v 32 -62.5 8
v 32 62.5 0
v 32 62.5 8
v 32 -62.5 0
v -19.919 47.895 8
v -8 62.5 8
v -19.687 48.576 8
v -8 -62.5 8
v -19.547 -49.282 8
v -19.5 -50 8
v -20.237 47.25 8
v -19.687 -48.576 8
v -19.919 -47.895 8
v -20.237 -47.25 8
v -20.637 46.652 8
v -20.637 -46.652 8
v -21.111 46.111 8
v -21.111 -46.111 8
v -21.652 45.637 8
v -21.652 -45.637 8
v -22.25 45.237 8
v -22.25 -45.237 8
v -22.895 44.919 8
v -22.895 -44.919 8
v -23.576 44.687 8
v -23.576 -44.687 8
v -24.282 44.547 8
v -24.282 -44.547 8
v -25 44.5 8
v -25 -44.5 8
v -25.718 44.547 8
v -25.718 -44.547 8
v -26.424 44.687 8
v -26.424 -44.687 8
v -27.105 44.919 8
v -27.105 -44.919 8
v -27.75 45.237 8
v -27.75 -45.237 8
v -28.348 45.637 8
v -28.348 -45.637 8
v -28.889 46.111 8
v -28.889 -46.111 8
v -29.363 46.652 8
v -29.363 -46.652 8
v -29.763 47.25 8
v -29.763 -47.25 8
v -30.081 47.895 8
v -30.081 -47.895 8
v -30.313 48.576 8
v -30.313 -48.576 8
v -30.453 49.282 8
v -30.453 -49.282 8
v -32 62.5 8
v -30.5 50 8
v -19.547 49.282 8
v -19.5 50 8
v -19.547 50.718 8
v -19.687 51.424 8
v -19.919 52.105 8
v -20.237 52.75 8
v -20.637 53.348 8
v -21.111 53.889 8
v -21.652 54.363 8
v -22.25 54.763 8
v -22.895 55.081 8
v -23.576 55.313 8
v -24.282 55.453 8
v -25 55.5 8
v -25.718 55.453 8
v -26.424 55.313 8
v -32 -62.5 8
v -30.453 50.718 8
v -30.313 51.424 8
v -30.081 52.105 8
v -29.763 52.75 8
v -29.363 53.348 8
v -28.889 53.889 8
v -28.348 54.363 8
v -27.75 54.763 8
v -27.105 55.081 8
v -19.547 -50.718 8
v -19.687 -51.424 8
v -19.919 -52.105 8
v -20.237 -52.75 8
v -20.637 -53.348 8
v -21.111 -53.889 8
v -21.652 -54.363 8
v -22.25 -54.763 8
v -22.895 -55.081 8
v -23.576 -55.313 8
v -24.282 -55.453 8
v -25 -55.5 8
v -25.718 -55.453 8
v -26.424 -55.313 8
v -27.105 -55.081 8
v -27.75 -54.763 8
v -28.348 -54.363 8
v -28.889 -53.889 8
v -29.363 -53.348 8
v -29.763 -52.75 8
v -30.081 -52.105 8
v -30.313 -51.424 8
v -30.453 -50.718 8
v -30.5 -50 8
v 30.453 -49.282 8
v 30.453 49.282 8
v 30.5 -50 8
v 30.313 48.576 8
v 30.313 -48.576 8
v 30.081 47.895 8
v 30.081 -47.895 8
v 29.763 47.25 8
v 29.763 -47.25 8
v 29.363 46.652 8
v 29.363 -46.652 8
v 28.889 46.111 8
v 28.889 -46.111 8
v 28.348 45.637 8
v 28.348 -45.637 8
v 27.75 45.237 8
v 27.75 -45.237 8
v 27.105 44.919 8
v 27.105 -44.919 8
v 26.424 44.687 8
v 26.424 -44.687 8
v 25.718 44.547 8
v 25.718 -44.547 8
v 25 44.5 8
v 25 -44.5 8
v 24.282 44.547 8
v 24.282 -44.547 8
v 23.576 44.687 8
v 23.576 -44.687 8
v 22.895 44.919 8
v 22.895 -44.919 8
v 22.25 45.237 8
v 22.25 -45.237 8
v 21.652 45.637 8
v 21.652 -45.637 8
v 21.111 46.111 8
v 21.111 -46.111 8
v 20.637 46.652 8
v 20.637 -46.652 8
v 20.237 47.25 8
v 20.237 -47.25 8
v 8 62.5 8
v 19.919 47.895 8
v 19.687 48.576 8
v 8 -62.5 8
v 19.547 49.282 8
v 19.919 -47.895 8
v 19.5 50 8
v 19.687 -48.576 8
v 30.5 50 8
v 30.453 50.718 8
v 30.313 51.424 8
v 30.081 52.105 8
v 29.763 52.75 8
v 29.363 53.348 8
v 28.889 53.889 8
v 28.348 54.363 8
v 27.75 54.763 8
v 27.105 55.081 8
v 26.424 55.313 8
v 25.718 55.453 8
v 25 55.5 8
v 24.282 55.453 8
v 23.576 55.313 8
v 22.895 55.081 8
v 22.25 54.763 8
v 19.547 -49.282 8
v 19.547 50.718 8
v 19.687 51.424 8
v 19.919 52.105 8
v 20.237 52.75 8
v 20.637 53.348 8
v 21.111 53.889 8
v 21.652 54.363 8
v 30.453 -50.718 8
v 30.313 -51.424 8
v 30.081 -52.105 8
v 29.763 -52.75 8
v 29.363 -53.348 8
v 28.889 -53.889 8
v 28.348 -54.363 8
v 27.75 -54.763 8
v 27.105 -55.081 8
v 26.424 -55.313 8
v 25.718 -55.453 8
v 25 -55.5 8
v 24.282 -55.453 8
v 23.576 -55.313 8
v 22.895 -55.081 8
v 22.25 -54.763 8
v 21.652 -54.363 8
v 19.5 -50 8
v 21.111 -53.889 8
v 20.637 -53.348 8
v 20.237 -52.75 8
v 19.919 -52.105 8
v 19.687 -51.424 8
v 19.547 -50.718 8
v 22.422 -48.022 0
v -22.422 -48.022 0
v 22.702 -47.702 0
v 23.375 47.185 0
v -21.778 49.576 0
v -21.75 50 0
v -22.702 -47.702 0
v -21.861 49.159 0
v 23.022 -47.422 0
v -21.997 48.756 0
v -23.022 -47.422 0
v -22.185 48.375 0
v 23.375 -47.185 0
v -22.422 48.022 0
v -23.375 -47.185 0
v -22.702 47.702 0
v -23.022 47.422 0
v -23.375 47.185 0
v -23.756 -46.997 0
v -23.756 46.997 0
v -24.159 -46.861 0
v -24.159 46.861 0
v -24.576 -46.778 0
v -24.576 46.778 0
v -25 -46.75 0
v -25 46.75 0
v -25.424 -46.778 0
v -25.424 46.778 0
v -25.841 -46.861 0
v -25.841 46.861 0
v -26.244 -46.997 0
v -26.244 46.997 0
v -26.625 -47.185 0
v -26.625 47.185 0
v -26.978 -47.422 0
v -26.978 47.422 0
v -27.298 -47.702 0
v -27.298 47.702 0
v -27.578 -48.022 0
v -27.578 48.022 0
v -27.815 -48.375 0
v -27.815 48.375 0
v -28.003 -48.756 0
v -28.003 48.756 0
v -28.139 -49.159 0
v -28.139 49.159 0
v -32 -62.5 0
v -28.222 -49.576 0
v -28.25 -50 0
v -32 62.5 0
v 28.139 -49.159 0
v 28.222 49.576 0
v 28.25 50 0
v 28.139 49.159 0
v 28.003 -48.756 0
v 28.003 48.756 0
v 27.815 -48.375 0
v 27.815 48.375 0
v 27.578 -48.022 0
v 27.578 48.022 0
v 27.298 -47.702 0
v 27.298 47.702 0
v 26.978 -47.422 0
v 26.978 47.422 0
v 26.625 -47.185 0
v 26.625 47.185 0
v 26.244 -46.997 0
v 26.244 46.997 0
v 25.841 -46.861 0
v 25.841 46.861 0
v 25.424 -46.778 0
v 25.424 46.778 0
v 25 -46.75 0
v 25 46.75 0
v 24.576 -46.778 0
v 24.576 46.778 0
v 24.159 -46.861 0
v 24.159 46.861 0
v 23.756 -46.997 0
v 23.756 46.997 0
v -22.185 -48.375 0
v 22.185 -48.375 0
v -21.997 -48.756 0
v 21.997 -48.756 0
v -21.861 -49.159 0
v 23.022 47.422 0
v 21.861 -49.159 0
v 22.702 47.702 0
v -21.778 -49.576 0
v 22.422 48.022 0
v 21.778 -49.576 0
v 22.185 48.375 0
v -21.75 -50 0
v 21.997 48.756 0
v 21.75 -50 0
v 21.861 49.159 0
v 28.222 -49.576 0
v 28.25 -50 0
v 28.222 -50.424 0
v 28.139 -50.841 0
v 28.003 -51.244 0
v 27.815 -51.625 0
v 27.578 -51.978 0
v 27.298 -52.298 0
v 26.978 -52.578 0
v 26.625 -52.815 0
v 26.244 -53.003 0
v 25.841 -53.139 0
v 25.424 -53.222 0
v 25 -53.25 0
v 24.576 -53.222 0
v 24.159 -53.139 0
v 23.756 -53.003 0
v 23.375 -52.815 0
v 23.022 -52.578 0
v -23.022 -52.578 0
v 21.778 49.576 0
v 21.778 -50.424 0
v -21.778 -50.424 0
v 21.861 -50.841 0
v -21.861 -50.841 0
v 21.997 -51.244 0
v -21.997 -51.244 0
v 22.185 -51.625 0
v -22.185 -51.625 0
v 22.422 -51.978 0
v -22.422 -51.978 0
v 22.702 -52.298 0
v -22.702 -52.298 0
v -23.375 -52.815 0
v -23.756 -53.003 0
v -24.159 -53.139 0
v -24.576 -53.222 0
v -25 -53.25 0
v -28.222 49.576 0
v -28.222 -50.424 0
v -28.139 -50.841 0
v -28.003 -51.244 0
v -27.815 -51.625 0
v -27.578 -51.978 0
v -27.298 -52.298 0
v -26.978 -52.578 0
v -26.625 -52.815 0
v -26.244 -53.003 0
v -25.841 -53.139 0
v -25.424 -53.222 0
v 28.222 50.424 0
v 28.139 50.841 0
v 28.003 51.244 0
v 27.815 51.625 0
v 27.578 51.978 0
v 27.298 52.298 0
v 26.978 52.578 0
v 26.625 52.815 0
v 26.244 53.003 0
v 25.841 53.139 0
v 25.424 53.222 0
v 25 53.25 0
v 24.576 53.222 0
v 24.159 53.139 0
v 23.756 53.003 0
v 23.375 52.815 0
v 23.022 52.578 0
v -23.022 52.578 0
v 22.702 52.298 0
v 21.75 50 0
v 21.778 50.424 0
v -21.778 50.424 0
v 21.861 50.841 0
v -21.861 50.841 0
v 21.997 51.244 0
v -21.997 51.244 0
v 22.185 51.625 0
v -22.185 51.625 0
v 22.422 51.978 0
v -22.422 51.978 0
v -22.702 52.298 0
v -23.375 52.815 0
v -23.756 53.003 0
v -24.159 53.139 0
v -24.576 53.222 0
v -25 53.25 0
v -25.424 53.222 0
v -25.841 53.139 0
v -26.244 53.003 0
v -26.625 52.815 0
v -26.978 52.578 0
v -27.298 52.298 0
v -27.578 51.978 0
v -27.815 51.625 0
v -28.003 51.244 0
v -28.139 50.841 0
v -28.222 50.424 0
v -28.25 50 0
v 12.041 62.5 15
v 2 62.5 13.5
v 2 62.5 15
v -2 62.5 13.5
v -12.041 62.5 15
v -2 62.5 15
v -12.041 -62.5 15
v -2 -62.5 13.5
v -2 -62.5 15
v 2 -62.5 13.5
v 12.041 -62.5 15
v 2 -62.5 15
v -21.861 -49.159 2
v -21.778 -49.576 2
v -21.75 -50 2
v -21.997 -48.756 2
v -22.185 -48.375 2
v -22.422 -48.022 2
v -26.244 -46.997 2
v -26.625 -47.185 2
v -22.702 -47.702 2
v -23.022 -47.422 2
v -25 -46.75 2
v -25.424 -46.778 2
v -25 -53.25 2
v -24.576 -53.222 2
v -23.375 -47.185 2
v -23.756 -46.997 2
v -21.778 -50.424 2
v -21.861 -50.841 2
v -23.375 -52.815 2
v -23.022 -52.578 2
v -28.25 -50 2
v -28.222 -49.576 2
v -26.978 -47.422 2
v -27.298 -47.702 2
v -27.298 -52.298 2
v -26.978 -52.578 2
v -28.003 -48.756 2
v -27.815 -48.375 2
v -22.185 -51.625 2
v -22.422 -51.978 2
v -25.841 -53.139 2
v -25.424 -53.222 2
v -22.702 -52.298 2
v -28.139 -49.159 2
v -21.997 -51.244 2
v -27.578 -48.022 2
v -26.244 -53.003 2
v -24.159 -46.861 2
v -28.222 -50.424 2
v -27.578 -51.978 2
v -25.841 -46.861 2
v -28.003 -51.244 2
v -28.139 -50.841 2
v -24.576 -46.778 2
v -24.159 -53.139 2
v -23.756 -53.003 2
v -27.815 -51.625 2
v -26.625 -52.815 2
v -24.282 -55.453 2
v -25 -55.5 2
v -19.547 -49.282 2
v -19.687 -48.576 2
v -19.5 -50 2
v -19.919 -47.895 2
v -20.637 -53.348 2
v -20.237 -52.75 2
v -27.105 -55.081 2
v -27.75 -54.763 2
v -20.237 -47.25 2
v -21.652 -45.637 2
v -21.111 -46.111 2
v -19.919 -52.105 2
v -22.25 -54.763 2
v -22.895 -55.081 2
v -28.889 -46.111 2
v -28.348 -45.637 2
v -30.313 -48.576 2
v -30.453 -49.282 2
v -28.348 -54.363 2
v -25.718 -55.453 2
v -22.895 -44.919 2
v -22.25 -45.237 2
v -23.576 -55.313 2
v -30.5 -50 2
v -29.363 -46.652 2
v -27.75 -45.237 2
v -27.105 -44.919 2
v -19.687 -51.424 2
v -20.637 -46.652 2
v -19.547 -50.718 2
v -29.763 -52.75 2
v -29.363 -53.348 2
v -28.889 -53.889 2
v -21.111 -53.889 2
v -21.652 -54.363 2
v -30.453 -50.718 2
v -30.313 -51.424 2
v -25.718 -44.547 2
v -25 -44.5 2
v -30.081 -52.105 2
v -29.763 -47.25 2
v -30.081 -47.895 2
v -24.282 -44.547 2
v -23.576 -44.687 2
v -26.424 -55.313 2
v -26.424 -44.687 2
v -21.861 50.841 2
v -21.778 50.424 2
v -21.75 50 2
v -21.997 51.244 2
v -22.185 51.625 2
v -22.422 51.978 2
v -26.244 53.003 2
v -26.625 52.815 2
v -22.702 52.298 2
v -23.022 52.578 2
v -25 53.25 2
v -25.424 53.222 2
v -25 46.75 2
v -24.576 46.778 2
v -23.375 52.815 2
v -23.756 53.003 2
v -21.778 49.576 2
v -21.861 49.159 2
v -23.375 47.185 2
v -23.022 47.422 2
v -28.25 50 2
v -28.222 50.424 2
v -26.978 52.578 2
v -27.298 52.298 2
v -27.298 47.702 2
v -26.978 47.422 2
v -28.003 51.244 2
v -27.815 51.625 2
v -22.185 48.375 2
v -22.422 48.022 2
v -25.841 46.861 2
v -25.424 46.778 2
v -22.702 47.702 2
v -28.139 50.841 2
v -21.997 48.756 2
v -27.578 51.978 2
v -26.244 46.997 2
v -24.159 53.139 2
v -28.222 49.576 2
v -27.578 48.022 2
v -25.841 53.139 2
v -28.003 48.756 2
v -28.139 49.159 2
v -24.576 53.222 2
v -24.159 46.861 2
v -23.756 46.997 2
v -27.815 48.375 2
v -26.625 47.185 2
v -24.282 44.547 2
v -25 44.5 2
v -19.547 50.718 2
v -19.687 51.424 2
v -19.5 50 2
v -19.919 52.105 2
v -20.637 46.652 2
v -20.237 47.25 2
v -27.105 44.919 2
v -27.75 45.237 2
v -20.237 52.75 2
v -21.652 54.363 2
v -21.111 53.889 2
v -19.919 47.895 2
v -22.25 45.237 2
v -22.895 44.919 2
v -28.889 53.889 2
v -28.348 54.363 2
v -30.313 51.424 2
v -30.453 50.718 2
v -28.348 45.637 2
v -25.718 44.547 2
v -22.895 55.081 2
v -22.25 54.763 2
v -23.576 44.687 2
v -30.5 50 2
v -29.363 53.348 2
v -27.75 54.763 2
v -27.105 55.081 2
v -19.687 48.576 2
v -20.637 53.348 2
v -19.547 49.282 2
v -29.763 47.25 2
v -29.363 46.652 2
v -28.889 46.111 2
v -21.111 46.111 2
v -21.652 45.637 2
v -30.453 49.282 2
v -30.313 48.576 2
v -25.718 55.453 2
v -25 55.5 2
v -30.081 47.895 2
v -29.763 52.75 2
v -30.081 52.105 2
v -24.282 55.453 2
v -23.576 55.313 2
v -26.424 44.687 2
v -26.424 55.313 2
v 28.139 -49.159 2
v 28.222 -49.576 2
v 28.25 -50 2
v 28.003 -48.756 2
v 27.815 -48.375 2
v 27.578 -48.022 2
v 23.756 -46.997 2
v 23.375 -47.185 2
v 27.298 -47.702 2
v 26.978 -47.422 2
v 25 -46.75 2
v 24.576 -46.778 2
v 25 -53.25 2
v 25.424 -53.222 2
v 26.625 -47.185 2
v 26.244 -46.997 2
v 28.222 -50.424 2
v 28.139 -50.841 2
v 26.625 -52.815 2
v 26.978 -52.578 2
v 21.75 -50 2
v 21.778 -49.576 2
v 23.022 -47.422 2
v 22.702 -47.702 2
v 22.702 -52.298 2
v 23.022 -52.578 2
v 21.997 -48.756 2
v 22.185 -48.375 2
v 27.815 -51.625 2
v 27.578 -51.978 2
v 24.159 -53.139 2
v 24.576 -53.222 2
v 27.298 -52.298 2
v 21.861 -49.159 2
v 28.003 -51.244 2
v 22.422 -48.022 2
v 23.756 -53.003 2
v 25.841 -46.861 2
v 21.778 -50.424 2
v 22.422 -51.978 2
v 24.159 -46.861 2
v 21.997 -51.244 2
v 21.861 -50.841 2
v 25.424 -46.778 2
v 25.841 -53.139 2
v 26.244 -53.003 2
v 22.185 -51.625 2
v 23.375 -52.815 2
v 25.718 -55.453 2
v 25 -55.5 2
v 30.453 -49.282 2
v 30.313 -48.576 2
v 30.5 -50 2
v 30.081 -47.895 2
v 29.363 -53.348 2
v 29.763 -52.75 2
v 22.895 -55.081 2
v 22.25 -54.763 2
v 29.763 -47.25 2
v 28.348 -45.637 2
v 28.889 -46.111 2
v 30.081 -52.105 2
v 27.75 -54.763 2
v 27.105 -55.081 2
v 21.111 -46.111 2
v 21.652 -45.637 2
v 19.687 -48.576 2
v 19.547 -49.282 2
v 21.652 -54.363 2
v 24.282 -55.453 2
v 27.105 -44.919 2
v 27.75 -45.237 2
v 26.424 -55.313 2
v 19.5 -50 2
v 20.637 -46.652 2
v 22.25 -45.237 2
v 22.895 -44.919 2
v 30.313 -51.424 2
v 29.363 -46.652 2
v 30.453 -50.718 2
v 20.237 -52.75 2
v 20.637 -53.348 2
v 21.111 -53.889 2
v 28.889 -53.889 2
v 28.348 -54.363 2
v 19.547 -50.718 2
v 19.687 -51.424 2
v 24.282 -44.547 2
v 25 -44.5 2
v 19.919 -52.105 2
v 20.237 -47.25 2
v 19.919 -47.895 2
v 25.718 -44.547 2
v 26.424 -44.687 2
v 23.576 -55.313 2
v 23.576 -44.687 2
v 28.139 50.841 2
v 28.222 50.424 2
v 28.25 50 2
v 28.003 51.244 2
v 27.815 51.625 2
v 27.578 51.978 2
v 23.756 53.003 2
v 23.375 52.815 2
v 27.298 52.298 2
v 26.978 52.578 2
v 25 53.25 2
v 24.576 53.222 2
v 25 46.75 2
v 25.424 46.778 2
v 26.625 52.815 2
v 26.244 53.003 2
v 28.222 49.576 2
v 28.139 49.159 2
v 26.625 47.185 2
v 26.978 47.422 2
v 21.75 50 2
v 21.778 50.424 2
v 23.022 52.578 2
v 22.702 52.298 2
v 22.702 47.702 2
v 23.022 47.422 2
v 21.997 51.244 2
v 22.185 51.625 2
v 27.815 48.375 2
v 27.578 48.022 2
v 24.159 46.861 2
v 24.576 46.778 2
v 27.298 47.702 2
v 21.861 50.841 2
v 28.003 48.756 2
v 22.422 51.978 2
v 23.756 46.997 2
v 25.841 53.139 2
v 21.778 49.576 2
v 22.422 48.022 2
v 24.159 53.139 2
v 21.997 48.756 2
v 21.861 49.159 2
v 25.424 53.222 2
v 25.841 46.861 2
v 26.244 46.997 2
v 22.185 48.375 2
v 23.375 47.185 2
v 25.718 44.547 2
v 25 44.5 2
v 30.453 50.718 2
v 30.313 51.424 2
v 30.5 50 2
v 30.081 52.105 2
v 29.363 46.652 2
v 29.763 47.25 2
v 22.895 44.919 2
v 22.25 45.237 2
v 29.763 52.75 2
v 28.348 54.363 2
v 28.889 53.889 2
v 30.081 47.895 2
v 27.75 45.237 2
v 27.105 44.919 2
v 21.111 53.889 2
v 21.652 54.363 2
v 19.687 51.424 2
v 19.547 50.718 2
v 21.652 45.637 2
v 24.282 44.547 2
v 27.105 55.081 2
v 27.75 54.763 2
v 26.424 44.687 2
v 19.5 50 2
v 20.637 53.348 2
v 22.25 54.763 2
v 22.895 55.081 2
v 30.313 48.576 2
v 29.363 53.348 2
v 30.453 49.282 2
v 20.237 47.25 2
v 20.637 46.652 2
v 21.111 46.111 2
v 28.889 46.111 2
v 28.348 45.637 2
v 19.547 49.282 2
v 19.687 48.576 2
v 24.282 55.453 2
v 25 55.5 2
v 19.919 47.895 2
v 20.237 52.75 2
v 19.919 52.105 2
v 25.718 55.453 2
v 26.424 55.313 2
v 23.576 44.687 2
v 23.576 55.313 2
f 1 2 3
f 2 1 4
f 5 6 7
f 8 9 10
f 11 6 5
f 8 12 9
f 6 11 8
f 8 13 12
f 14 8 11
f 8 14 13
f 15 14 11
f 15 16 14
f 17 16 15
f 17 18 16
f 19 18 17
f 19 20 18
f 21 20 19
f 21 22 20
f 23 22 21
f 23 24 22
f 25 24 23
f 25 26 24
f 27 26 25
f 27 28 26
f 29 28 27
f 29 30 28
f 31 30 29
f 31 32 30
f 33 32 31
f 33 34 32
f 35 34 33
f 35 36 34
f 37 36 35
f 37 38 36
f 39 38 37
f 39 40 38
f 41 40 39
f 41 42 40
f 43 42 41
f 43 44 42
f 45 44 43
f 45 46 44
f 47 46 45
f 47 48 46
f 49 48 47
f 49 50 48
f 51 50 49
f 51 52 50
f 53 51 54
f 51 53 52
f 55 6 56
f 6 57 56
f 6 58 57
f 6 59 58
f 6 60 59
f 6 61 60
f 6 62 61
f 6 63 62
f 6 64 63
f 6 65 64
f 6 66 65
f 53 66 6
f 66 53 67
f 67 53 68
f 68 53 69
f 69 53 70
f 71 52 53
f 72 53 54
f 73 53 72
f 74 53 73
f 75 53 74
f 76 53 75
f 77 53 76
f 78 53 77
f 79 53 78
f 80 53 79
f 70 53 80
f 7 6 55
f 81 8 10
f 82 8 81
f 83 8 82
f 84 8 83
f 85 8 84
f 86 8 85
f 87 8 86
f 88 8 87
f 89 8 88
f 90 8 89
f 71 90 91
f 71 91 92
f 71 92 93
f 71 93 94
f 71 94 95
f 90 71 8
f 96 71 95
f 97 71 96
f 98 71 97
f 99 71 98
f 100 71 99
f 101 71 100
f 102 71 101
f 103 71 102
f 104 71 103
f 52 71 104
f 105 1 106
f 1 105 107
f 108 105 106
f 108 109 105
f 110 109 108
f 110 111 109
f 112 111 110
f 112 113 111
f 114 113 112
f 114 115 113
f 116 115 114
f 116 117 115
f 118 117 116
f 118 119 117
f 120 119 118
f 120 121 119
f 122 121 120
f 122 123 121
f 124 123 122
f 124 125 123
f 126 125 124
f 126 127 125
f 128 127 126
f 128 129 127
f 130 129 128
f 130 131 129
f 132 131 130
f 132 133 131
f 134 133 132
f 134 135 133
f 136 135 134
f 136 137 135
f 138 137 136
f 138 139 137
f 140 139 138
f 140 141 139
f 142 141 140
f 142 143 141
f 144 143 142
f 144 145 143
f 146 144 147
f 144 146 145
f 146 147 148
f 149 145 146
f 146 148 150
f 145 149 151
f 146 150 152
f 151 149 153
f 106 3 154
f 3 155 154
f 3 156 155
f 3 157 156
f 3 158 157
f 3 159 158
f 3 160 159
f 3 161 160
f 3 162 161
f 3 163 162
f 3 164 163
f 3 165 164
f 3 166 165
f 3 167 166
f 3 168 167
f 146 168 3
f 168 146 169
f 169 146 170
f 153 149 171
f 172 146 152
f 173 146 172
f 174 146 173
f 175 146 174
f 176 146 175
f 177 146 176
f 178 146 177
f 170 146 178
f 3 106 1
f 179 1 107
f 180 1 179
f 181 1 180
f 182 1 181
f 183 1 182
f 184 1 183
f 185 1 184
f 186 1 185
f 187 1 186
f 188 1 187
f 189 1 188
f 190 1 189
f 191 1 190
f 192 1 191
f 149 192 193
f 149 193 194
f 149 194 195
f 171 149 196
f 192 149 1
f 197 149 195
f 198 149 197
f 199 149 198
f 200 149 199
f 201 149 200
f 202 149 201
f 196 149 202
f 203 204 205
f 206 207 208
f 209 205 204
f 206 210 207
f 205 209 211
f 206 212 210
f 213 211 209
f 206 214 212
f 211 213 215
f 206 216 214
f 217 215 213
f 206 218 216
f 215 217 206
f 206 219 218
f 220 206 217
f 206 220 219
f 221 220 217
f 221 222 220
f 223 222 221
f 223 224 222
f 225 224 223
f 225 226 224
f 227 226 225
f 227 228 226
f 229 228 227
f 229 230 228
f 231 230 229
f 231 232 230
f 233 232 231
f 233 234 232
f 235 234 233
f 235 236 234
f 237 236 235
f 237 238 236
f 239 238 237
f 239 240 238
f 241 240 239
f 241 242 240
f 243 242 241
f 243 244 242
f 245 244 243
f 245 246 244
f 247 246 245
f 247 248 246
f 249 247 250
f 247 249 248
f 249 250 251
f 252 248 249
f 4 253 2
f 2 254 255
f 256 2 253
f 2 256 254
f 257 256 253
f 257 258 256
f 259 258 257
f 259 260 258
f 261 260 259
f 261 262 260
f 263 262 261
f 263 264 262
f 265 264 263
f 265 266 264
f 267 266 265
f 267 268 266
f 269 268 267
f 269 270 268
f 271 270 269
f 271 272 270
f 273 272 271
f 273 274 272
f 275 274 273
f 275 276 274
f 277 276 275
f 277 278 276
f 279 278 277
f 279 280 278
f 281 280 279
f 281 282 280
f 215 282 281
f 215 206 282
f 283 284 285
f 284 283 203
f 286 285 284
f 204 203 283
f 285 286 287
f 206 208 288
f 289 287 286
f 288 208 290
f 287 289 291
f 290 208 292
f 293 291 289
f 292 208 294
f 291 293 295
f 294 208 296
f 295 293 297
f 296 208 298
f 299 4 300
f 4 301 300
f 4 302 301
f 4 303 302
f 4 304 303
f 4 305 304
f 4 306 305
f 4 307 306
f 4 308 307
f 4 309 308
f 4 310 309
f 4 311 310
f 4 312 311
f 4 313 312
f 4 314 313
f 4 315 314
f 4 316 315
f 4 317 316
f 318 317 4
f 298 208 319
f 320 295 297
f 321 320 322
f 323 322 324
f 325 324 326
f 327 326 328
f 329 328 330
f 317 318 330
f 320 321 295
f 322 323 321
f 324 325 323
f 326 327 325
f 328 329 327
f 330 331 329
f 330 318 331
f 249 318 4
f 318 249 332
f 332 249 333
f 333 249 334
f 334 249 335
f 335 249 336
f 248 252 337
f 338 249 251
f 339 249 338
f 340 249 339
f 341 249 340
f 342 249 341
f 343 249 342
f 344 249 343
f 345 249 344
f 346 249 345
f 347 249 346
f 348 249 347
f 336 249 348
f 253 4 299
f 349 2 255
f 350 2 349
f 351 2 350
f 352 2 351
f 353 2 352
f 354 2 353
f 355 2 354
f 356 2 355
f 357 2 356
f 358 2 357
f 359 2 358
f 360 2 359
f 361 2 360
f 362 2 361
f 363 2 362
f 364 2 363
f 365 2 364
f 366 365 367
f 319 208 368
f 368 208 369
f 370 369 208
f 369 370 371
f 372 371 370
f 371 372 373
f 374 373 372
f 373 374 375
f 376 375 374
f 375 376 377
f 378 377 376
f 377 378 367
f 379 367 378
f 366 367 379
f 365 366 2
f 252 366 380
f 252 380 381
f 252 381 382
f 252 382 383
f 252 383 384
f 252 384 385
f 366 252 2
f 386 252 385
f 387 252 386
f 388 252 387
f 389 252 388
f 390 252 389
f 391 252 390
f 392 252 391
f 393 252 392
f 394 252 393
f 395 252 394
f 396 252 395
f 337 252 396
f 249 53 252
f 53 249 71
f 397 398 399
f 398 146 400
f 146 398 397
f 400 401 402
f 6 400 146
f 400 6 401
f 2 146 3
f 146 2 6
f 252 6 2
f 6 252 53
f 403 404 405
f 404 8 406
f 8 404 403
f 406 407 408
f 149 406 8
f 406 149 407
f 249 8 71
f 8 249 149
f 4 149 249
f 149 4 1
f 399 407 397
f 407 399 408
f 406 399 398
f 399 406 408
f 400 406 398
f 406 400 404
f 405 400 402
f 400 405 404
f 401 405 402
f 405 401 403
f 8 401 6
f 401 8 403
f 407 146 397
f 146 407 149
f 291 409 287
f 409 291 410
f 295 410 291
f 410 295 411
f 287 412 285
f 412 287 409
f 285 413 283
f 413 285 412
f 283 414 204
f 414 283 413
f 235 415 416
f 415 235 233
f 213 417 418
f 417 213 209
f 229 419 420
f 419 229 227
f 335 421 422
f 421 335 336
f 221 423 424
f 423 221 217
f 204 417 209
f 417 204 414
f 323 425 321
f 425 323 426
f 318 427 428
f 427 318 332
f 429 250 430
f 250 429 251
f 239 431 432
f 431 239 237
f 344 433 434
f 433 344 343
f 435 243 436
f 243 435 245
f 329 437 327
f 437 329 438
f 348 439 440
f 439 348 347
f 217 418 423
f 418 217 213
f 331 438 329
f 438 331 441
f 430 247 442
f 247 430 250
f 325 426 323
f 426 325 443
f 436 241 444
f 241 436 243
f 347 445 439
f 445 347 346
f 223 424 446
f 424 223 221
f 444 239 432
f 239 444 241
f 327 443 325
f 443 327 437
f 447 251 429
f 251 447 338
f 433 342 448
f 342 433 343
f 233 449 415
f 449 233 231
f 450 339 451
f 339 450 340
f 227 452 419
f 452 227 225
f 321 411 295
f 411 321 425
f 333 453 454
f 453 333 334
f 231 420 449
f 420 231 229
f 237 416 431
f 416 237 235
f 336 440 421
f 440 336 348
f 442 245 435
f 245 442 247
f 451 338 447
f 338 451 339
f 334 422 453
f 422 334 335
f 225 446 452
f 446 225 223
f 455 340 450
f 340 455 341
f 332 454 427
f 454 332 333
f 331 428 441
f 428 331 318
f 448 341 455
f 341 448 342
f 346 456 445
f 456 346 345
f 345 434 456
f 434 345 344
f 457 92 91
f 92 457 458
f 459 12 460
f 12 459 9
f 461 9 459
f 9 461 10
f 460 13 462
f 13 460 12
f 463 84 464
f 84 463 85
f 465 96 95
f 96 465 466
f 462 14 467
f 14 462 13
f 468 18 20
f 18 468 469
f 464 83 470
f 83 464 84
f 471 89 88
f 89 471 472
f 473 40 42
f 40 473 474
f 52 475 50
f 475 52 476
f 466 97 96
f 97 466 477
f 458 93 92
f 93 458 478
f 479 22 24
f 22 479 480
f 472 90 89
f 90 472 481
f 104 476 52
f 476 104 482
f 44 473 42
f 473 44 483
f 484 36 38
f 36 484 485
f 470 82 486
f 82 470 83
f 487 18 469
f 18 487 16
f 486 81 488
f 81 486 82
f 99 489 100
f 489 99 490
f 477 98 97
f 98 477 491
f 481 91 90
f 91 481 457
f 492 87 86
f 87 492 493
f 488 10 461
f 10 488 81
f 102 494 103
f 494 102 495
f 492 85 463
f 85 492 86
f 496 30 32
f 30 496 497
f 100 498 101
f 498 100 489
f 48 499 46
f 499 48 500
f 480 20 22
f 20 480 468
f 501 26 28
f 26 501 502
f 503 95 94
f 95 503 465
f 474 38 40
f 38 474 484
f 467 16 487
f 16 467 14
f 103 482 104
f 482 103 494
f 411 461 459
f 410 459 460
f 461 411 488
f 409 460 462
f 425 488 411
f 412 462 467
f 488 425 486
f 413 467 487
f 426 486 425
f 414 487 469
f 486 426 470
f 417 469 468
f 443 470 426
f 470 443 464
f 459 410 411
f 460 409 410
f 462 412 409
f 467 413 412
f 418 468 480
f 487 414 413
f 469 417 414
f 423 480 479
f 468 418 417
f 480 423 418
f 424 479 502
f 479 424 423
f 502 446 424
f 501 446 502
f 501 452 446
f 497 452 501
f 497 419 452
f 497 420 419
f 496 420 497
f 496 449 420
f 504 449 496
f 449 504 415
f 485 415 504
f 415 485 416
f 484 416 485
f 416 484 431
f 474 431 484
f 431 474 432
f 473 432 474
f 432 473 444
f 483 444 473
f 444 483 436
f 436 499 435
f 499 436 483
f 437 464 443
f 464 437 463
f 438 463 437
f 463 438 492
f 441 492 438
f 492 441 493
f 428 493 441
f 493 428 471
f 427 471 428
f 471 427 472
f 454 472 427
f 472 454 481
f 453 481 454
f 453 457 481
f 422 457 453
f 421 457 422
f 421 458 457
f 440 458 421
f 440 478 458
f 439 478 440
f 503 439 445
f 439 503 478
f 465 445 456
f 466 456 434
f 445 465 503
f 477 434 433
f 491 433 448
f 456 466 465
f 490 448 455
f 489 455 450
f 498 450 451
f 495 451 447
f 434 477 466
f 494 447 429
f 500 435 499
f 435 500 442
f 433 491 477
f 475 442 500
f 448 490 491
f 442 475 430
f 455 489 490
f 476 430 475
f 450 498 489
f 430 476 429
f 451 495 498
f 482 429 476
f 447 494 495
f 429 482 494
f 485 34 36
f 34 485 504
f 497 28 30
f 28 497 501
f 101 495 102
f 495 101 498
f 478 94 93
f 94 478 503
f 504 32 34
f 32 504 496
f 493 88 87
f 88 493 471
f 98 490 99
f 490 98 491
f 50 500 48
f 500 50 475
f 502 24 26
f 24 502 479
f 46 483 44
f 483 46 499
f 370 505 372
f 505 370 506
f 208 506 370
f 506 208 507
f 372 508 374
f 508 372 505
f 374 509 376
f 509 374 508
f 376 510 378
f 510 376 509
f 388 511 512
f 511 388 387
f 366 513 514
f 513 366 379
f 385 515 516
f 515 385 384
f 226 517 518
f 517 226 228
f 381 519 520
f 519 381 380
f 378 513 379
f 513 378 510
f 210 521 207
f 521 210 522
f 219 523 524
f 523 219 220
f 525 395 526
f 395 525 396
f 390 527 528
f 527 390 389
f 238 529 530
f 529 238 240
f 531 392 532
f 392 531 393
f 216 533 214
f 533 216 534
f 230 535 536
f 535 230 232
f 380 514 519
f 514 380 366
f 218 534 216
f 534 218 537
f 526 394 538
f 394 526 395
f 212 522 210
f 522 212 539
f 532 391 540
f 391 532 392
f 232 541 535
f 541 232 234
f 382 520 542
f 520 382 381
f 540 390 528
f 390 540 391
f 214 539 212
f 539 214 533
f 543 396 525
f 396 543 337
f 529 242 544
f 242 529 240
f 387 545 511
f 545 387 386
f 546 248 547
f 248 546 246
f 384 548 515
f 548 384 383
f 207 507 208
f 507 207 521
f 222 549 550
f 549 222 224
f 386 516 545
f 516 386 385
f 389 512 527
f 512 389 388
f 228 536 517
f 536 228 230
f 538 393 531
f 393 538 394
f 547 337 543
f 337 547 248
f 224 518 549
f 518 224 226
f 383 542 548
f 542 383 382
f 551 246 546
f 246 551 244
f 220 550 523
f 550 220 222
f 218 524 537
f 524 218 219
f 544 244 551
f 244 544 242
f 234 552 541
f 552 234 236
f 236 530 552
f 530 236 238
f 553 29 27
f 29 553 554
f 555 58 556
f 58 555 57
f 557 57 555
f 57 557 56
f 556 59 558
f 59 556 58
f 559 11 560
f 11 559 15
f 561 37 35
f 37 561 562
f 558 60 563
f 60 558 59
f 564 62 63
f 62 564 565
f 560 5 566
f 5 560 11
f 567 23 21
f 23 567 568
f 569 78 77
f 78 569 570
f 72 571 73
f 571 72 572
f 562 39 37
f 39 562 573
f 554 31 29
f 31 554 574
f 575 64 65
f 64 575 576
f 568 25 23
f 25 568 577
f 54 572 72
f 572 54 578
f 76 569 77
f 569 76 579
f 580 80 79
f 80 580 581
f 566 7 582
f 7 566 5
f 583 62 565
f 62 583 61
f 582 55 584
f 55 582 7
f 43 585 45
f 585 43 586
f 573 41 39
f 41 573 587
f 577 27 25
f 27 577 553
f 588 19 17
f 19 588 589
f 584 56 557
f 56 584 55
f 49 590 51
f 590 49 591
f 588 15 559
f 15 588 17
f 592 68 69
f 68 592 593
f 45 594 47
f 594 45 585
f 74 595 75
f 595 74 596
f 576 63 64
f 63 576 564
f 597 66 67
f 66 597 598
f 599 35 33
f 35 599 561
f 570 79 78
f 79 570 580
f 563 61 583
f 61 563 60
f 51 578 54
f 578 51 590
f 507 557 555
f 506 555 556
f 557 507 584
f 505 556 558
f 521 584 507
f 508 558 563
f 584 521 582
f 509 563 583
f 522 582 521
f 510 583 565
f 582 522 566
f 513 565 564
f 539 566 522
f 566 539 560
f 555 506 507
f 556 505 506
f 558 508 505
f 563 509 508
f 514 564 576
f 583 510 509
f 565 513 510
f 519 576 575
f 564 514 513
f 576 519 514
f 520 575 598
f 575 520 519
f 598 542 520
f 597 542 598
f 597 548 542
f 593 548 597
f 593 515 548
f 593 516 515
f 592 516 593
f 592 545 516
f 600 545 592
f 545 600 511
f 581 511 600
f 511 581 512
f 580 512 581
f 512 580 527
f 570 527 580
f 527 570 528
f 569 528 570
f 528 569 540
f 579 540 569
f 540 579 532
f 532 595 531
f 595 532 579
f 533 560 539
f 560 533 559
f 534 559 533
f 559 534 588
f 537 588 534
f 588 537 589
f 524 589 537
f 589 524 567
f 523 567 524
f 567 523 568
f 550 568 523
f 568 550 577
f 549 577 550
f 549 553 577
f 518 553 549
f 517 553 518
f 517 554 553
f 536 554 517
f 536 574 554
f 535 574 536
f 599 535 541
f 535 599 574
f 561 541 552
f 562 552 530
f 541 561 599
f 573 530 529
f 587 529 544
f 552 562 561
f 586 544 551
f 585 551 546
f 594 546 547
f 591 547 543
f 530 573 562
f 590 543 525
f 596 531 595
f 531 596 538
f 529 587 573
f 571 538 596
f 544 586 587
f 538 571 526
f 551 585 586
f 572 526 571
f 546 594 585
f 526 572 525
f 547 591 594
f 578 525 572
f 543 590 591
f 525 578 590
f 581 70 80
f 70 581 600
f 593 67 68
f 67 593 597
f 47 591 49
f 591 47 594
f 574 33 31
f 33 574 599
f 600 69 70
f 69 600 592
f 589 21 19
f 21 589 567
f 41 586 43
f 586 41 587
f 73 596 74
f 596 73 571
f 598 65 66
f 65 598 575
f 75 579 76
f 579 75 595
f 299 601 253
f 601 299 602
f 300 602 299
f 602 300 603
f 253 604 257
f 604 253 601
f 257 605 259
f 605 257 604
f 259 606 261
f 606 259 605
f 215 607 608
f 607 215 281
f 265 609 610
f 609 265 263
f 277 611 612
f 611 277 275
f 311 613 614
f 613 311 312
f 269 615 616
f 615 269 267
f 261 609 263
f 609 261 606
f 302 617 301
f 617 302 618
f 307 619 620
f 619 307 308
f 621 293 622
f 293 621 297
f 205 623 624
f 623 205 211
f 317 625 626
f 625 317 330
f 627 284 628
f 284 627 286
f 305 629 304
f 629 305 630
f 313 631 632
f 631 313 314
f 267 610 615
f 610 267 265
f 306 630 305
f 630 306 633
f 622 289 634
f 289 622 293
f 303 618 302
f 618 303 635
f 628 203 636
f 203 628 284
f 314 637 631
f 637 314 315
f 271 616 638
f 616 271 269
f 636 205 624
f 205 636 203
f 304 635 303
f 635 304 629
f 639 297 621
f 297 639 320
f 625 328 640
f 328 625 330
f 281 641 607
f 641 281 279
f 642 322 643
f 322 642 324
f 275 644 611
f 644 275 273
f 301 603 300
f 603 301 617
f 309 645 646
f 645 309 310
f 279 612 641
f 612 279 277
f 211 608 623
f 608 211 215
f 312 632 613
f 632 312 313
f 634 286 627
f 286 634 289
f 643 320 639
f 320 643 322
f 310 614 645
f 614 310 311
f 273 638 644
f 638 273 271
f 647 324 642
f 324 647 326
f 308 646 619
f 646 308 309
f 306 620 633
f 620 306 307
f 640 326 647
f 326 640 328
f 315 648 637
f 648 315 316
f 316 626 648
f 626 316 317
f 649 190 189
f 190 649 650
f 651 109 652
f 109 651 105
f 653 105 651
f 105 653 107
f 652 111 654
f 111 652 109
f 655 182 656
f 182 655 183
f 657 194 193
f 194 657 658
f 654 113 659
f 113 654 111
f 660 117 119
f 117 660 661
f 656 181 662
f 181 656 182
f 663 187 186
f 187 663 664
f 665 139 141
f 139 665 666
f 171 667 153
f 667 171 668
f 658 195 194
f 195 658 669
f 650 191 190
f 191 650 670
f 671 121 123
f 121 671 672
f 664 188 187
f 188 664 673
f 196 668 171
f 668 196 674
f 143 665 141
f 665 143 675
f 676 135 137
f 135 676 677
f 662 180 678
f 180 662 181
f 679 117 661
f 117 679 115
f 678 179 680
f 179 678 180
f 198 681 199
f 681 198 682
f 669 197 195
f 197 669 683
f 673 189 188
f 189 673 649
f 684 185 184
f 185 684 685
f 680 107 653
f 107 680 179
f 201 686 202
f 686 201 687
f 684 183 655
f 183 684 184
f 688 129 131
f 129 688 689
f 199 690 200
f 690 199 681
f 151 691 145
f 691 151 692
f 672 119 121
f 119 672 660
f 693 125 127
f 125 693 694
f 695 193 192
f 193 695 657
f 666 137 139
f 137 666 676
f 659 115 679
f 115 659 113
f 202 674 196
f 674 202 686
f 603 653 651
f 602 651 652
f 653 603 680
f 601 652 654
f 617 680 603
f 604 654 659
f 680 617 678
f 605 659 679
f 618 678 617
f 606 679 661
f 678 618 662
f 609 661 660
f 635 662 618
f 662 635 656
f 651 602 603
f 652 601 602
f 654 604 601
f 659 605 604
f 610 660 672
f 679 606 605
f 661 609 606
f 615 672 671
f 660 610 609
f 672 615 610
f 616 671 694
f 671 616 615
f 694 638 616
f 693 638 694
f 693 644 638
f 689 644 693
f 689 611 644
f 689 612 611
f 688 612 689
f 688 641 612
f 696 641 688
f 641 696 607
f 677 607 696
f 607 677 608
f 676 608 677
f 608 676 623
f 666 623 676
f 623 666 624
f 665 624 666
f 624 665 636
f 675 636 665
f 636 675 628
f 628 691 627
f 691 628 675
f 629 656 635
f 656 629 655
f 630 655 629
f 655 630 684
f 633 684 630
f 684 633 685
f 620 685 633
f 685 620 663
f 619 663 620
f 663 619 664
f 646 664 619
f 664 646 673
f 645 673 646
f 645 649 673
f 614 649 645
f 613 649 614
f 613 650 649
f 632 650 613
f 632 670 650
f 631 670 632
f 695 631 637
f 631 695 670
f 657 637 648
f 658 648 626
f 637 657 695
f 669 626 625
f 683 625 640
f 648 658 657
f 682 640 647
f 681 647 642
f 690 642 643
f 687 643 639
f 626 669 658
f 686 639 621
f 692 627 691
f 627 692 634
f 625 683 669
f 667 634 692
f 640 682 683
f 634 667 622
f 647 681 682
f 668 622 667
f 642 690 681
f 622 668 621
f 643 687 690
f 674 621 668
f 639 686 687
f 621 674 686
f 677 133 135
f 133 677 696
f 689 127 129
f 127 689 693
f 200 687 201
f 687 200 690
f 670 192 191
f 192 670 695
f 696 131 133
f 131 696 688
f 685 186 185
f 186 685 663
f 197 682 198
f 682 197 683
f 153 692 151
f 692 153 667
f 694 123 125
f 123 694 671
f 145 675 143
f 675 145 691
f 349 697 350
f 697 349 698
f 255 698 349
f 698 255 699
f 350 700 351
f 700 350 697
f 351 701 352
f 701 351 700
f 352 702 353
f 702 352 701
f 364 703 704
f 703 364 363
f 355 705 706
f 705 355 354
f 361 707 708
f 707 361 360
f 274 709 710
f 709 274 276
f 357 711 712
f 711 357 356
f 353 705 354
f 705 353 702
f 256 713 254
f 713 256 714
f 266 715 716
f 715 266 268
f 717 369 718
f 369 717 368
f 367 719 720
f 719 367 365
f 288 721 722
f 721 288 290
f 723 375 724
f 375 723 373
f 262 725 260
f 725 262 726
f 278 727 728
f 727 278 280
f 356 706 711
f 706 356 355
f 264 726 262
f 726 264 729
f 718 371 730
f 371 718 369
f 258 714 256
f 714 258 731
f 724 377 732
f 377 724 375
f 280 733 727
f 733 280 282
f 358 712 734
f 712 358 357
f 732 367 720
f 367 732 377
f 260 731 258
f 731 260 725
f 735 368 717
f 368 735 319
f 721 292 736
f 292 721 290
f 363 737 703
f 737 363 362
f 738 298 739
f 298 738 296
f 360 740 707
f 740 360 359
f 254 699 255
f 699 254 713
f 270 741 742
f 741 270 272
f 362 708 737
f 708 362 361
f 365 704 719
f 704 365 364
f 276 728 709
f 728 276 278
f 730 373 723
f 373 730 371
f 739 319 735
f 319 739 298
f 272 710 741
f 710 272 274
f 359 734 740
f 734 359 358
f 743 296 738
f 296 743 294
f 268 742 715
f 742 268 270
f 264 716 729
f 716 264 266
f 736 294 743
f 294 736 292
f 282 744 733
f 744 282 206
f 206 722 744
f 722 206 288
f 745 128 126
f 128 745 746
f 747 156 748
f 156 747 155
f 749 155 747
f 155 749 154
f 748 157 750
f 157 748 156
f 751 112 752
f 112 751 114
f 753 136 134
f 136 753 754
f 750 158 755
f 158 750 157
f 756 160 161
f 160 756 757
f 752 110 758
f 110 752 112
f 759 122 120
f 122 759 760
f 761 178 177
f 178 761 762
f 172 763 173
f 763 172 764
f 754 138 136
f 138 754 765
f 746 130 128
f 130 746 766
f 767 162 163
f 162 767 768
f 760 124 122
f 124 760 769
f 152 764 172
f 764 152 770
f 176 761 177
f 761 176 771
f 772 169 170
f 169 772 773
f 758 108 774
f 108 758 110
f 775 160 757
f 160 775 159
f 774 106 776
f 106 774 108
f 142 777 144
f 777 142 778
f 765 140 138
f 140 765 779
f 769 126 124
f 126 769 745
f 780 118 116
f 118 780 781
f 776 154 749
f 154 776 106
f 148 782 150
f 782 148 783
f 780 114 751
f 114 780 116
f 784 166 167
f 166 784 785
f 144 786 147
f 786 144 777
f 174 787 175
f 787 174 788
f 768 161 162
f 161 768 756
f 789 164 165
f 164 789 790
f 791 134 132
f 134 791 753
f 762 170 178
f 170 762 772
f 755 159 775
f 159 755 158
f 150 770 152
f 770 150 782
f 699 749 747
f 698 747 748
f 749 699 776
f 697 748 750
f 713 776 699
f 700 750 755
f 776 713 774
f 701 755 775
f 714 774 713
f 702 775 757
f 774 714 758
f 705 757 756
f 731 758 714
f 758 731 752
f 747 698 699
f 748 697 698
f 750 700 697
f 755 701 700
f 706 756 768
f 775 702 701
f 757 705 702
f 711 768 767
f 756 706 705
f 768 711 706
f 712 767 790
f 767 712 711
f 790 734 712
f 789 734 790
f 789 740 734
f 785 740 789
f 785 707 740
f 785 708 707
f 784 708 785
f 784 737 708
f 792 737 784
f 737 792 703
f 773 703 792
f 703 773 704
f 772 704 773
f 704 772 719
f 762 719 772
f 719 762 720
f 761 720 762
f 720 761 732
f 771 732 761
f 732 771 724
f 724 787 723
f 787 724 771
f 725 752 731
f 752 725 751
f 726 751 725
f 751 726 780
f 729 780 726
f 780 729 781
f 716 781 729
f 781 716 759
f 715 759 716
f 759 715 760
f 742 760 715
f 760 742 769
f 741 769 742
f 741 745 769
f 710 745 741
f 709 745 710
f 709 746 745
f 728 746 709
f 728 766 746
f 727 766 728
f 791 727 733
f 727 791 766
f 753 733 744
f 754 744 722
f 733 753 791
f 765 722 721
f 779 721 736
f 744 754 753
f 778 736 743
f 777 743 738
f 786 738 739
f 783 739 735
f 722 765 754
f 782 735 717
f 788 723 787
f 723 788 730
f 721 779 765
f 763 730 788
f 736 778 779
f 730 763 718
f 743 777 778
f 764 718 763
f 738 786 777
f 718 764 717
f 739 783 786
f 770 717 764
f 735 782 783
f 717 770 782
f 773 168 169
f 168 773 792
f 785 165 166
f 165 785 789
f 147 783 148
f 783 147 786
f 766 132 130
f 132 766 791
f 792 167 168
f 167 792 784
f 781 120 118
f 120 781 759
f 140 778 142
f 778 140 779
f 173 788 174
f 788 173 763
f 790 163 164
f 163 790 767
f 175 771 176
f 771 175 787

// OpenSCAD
// Dovetail rail, bolted to the M6 grid.
include <camera_mount.scad>

rail();
